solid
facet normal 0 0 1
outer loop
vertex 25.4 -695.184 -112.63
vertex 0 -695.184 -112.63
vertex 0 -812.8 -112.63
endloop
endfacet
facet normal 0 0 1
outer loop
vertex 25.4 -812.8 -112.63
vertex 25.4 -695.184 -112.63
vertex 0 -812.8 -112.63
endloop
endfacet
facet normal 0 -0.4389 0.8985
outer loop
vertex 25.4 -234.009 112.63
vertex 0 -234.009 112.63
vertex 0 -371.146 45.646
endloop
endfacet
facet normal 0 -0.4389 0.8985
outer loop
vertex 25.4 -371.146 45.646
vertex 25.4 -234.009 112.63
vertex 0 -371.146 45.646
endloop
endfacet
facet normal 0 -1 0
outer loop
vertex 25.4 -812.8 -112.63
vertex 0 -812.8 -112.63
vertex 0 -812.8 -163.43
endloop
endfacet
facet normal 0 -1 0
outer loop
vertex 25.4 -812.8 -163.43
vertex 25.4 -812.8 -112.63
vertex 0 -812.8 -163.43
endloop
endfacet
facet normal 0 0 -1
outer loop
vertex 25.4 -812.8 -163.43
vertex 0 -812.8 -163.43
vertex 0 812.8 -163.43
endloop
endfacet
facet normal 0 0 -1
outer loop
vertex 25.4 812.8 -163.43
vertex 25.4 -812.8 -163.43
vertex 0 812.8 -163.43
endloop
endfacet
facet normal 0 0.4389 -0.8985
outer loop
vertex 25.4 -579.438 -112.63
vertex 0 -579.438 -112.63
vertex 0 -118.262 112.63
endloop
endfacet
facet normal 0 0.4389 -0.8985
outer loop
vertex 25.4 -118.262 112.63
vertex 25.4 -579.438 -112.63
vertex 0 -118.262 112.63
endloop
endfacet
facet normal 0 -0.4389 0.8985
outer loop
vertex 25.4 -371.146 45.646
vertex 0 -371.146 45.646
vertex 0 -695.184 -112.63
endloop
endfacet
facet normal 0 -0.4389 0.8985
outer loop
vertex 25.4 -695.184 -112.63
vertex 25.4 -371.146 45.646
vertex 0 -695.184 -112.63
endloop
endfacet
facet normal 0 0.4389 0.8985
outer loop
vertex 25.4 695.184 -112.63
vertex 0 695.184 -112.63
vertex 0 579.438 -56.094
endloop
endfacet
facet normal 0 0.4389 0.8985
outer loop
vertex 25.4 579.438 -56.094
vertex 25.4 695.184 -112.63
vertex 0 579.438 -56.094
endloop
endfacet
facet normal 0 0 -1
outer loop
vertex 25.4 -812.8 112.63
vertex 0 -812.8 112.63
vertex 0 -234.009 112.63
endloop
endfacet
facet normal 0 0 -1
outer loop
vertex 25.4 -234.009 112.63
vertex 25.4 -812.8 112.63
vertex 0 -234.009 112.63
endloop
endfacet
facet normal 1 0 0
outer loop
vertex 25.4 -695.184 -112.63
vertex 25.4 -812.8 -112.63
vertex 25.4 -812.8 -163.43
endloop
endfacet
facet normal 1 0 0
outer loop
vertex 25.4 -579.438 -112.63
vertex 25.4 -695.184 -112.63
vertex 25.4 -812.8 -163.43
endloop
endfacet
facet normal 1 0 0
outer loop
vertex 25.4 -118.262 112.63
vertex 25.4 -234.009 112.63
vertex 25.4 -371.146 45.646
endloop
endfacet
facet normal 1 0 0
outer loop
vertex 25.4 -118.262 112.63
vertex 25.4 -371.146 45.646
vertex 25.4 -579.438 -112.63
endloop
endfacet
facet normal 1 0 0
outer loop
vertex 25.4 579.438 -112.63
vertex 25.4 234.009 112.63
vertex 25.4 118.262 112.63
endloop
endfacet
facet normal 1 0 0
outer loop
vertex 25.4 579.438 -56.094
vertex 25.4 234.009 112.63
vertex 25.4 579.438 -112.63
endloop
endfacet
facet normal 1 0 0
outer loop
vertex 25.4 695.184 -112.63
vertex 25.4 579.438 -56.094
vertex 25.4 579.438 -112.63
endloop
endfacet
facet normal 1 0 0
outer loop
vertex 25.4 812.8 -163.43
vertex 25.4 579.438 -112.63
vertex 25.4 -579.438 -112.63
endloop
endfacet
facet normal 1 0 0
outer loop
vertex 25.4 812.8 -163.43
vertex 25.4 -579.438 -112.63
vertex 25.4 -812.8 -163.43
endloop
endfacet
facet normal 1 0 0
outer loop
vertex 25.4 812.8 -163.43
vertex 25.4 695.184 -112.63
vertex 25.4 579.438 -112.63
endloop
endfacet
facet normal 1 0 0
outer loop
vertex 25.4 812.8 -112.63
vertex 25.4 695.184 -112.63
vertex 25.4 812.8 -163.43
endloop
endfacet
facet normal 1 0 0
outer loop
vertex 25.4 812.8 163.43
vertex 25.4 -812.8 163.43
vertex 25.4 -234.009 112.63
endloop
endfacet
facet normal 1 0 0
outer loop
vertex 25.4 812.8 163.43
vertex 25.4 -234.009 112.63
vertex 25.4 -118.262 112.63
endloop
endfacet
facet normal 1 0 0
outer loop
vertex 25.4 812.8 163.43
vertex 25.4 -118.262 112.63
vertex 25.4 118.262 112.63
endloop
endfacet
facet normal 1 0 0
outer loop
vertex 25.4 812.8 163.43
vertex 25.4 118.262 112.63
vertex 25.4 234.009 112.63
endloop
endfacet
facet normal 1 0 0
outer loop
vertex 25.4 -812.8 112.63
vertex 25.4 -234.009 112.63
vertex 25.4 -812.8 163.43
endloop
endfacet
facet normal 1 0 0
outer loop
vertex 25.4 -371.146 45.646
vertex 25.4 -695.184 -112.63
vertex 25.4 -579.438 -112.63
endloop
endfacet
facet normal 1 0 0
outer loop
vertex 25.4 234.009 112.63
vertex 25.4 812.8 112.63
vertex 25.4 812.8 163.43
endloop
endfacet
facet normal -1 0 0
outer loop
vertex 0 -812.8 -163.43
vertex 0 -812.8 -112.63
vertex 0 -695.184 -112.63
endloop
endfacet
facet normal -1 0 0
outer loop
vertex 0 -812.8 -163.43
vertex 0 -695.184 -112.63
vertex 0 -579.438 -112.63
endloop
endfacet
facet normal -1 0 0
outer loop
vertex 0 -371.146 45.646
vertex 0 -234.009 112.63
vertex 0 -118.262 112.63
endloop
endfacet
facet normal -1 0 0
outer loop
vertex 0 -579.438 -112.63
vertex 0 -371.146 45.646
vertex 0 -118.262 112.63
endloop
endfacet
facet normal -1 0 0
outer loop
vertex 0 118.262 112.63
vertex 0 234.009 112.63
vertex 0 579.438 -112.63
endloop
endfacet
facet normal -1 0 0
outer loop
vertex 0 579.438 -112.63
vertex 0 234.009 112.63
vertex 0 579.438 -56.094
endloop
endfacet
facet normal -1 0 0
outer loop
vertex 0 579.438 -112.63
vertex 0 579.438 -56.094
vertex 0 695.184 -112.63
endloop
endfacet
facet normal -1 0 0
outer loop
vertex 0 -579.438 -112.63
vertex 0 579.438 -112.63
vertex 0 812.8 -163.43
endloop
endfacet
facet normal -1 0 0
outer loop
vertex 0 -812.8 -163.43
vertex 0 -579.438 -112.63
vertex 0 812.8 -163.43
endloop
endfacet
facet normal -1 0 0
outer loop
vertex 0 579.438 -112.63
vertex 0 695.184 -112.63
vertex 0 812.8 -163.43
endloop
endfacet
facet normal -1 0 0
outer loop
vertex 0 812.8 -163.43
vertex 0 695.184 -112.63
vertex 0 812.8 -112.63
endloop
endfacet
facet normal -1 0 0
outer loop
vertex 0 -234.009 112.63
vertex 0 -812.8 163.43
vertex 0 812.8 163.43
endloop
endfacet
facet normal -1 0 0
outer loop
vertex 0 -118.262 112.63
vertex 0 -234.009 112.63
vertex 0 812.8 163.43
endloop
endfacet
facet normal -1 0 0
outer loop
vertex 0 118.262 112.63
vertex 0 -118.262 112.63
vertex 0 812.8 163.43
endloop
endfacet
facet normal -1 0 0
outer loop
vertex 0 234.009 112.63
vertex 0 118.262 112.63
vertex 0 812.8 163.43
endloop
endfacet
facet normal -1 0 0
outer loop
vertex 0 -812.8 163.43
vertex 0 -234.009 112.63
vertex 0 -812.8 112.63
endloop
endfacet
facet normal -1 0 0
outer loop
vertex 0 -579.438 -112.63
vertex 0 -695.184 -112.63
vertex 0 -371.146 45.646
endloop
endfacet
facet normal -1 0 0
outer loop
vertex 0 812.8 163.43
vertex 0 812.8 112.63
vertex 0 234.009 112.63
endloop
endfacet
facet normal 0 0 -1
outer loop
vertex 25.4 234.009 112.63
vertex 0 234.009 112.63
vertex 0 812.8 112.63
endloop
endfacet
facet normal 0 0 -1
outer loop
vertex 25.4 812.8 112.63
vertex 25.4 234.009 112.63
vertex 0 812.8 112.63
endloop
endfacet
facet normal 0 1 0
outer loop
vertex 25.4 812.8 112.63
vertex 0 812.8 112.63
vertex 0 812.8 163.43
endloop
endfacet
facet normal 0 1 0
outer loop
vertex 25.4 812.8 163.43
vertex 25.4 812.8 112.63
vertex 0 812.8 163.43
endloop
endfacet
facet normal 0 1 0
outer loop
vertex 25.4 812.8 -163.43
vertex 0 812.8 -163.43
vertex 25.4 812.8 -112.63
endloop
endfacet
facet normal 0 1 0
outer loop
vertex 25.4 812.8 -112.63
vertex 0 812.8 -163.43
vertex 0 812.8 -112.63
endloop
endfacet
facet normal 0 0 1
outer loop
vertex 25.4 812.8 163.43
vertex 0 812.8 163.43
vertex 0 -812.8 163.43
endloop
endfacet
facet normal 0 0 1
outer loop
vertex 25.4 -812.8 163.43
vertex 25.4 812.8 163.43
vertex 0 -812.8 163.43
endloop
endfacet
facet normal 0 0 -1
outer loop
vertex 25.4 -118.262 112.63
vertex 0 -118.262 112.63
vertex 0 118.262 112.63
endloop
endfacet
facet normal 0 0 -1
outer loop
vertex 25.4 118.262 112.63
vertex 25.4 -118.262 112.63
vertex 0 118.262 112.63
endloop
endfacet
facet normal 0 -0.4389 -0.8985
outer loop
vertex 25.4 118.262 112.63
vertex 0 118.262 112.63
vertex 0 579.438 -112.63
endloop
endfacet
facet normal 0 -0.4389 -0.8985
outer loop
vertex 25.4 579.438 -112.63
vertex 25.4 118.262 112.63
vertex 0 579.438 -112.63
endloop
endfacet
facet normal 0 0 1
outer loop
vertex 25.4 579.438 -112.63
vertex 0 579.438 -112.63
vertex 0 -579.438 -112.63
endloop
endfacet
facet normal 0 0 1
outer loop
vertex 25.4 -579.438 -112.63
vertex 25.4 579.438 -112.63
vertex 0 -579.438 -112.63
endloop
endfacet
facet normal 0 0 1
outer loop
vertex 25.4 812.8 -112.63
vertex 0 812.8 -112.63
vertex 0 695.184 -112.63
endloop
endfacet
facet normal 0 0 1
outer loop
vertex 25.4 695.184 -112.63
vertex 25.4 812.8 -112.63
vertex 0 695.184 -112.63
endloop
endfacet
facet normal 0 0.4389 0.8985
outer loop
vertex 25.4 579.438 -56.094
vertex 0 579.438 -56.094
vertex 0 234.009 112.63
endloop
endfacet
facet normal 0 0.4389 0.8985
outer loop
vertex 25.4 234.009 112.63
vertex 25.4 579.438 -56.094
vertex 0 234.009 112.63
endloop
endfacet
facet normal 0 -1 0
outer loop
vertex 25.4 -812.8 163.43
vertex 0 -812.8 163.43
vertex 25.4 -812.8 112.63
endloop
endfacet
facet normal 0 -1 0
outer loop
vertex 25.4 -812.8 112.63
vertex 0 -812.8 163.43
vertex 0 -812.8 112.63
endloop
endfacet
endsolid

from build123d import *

# Parameters (mm, degrees)
F1_DEPTH = 25.4


with BuildPart() as f1:
    # F0 (on Right) → F1 (new body)
    with BuildSketch(Plane.YZ):
        Polygon((812.8, 112.629811), (812.8, 163.429811), (-812.8, 163.429811), (-812.8, 112.629811), (-579.4375, 112.629811), (-234.009025, 112.629811), (-118.2624, 112.629811), (118.2624, 112.629811), (234.009025, 112.629811), (579.4375, 112.629811), align=None)
        Polygon((-118.2624, 112.629811), (-234.009025, 112.629811), (-371.145546, 45.64588), (-695.184125, -112.629811), (-579.4375, -112.629811), align=None)
        Polygon((579.4375, -56.093712), (234.009025, 112.629811), (118.2624, 112.629811), (579.4375, -112.629811), (695.184125, -112.629811), align=None)
        Polygon((695.184125, -112.629811), (579.4375, -112.629811), (118.2624, -112.629811), (-118.2624, -112.629811), (-579.4375, -112.629811), (-695.184125, -112.629811), (-812.8, -112.629811), (-812.8, -163.429811), (812.8, -163.429811), (812.8, -112.629811), align=None)
    extrude(amount=F1_DEPTH)


solid = f1.part
